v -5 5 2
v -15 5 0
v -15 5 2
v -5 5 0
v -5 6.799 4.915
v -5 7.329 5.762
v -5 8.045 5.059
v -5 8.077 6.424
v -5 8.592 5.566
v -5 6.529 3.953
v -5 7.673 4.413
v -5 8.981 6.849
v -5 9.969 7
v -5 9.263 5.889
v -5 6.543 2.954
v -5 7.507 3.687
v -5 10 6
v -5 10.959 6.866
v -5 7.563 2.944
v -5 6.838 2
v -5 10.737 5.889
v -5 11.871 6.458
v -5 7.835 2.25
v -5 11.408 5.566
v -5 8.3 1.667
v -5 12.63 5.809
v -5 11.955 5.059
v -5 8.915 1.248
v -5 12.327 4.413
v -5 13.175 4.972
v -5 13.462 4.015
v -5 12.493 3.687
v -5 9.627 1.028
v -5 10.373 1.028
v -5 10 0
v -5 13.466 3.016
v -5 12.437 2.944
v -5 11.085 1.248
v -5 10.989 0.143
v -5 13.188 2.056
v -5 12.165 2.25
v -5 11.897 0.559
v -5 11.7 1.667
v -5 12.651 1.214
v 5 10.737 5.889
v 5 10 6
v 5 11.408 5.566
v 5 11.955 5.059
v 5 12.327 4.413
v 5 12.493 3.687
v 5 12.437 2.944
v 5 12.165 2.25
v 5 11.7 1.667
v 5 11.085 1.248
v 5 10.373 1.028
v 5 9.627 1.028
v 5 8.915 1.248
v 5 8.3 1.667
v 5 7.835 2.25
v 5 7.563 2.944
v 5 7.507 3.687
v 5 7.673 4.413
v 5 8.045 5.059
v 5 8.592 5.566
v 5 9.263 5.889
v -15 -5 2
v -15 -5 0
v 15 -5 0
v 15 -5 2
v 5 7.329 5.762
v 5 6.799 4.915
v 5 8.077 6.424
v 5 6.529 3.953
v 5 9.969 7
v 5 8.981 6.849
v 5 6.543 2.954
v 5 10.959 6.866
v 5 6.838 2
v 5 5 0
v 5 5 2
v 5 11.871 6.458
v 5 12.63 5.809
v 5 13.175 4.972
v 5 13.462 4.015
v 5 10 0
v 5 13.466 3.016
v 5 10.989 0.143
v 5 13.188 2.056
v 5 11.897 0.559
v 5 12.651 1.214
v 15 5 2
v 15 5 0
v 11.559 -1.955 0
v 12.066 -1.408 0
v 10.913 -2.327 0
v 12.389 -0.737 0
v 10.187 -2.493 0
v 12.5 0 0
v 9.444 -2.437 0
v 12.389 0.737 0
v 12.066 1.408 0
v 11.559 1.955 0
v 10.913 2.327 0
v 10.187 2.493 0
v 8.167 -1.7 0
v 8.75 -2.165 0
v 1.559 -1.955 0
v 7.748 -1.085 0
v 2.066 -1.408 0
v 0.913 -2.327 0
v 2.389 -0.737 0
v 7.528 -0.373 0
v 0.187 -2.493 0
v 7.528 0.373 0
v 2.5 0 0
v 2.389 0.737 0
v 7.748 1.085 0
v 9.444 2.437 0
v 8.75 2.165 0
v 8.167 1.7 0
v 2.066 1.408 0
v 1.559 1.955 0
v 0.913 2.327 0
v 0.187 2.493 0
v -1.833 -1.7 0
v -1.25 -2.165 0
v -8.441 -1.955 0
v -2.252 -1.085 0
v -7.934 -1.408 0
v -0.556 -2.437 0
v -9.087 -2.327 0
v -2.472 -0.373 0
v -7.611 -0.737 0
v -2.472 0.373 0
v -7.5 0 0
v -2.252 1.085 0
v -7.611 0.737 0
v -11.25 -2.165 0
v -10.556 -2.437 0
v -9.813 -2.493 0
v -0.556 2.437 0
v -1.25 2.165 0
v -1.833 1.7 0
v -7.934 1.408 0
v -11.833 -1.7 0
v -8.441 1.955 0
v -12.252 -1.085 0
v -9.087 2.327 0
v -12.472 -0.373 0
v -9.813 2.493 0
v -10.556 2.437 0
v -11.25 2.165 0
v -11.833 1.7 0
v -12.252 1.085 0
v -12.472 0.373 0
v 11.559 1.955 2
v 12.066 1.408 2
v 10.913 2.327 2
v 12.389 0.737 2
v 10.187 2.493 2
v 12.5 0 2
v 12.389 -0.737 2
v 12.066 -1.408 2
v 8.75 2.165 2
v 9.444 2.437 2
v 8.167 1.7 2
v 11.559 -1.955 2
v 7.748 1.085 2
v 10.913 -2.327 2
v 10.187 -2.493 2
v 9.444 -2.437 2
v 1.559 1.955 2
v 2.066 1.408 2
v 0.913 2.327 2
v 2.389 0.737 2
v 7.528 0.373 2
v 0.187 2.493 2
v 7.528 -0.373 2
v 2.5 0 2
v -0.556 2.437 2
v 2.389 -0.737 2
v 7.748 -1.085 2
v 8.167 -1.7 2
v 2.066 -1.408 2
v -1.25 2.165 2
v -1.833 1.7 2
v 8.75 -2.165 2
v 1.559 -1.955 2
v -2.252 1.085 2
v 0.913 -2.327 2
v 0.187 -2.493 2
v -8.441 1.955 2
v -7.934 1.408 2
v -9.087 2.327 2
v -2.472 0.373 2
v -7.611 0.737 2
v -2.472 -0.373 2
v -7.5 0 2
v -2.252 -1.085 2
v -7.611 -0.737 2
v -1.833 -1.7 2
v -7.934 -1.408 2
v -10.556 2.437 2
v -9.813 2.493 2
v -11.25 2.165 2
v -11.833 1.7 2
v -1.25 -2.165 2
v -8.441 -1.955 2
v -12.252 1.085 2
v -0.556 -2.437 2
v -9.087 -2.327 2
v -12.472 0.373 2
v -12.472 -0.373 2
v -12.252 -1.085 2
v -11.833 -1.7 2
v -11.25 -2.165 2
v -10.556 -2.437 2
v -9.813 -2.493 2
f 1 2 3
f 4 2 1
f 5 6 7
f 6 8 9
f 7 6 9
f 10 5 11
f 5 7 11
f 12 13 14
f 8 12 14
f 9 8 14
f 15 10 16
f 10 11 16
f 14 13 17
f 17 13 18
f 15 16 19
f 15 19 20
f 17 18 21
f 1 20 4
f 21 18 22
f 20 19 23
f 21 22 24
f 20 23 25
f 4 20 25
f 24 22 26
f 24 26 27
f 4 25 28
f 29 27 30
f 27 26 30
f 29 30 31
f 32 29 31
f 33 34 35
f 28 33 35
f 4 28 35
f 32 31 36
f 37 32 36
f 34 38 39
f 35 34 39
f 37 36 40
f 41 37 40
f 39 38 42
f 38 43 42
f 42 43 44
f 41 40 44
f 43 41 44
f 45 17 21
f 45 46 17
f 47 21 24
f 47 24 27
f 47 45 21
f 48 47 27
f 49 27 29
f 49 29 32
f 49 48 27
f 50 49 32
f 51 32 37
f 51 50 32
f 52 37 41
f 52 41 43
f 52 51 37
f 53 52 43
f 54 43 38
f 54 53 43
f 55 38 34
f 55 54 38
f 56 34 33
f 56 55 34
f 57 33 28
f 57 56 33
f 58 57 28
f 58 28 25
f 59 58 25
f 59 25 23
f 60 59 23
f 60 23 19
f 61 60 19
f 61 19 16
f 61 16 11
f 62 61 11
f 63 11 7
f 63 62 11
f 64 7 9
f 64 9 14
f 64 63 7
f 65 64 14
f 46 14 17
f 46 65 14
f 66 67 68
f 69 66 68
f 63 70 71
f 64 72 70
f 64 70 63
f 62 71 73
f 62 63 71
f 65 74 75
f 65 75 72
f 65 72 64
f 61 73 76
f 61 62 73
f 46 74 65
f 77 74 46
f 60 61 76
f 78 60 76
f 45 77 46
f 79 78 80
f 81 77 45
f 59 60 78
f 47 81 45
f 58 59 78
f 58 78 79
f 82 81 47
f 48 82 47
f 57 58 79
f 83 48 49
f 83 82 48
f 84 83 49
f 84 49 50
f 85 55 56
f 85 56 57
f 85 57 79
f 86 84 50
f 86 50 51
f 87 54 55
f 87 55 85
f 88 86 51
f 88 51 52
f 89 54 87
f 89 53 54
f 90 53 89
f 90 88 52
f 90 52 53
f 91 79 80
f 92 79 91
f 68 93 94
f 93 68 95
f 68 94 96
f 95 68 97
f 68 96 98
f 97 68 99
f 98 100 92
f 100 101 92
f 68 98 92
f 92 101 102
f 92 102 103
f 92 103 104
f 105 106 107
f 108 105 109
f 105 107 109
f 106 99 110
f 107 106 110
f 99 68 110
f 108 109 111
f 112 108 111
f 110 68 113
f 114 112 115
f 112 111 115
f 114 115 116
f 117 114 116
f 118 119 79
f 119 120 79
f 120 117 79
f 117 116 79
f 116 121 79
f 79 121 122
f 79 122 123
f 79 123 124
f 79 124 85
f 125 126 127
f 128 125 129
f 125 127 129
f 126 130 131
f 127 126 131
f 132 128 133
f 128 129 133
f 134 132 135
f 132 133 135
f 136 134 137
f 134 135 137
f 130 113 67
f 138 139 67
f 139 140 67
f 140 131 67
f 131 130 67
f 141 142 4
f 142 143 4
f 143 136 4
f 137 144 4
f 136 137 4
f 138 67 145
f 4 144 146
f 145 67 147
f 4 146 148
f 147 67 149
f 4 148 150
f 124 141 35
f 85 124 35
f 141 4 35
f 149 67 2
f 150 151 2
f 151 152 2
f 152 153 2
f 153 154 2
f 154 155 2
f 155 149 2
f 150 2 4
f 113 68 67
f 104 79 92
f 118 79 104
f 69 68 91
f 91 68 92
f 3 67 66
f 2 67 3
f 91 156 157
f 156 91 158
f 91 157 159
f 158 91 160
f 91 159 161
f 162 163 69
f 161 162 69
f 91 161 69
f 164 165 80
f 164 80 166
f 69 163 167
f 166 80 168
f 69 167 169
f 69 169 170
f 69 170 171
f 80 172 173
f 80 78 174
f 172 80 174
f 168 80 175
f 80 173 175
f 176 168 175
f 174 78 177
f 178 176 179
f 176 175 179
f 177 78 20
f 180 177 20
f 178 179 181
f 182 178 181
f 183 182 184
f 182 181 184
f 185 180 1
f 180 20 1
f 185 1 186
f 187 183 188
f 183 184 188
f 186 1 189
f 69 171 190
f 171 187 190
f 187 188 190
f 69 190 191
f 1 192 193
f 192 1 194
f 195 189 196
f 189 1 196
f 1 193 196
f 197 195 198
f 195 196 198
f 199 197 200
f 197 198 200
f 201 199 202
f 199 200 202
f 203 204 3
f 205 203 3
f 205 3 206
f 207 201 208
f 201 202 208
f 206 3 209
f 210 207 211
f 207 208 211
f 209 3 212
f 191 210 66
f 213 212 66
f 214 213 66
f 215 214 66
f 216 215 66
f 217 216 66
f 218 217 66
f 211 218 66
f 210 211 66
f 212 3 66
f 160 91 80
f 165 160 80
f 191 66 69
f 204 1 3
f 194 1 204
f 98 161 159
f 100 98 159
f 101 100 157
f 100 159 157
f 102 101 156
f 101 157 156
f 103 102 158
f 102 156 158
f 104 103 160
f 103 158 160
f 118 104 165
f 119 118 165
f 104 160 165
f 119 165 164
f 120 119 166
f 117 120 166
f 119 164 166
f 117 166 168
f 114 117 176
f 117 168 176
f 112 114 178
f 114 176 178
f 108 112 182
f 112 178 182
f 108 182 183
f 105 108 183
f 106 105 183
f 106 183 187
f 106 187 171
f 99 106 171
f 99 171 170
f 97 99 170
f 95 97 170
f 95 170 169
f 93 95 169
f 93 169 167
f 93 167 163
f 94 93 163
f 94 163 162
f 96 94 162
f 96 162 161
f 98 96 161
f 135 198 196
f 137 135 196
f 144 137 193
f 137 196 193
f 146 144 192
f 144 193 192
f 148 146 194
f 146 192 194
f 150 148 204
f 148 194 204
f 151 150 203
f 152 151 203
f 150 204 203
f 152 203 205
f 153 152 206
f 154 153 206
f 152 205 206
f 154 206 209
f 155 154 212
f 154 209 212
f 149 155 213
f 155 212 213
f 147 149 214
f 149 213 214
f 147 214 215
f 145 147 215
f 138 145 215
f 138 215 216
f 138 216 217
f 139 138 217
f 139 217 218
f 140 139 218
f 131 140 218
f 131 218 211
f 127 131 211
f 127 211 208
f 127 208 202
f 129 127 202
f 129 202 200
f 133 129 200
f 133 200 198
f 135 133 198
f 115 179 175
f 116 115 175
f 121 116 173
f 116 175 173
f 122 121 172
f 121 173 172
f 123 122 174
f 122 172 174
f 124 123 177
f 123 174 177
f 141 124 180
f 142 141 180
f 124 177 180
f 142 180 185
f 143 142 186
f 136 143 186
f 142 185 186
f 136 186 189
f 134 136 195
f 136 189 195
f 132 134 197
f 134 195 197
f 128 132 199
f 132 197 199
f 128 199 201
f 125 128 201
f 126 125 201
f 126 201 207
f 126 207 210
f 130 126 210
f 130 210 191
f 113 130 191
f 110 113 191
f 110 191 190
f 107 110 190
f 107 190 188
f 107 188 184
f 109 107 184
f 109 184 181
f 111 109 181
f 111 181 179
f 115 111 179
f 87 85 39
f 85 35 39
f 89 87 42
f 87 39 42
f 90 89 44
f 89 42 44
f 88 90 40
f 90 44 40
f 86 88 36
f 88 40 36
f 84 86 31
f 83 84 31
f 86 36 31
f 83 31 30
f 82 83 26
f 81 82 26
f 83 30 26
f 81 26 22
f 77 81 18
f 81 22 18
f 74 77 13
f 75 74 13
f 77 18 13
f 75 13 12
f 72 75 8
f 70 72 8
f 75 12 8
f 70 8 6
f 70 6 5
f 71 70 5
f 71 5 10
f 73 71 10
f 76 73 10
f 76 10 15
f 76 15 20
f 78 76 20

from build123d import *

# Parameters (mm, degrees)
SKETCH1_W                = 30
SKETCH1_H                = 10
BOSS_EXTRUDE1_DEPTH      = 2
SKETCH2_R                = 2.5
BOSS_EXTRUDE2_DEPTH      = 5
BOSS_EXTRUDE2_DEPTH_BACK = 5
SKETCH3_R                = 2.5
CUT_EXTRUDE1_DEPTH       = 10


with BuildPart() as part:
    # Sketch1 → Boss-Extrude1 (new body)
    with BuildSketch(Plane.XY):
        Rectangle(SKETCH1_W, SKETCH1_H)
    extrude(amount=BOSS_EXTRUDE1_DEPTH)

    # Sketch2 → Boss-Extrude2 (add, two sides)
    with BuildSketch(Plane.ZY) as boss_extrude2_sk:
        with BuildLine():
            Line((0, 5), (0, 10))
            ThreePointArc((0, 10), (6.458039892, 11.870828693), (2, 6.83772234))
            Line((2, 6.83772234), (2, 5))
            Line((2, 5), (0, 5))
        make_face()
        with Locations((3.5, 10)):
            Circle(SKETCH2_R, mode=Mode.SUBTRACT)
    extrude(amount=BOSS_EXTRUDE2_DEPTH)
    extrude(boss_extrude2_sk.sketch, amount=-BOSS_EXTRUDE2_DEPTH_BACK)

    # Sketch3 → Cut-Extrude1 (cut)
    with BuildSketch(Plane.XY.offset(2)):
        with Locations((-10, 0)):
            Circle(SKETCH3_R)
        Circle(SKETCH3_R)
        with Locations((10, 0)):
            Circle(SKETCH3_R)
    extrude(amount=-CUT_EXTRUDE1_DEPTH, mode=Mode.SUBTRACT)


solid = part.part
